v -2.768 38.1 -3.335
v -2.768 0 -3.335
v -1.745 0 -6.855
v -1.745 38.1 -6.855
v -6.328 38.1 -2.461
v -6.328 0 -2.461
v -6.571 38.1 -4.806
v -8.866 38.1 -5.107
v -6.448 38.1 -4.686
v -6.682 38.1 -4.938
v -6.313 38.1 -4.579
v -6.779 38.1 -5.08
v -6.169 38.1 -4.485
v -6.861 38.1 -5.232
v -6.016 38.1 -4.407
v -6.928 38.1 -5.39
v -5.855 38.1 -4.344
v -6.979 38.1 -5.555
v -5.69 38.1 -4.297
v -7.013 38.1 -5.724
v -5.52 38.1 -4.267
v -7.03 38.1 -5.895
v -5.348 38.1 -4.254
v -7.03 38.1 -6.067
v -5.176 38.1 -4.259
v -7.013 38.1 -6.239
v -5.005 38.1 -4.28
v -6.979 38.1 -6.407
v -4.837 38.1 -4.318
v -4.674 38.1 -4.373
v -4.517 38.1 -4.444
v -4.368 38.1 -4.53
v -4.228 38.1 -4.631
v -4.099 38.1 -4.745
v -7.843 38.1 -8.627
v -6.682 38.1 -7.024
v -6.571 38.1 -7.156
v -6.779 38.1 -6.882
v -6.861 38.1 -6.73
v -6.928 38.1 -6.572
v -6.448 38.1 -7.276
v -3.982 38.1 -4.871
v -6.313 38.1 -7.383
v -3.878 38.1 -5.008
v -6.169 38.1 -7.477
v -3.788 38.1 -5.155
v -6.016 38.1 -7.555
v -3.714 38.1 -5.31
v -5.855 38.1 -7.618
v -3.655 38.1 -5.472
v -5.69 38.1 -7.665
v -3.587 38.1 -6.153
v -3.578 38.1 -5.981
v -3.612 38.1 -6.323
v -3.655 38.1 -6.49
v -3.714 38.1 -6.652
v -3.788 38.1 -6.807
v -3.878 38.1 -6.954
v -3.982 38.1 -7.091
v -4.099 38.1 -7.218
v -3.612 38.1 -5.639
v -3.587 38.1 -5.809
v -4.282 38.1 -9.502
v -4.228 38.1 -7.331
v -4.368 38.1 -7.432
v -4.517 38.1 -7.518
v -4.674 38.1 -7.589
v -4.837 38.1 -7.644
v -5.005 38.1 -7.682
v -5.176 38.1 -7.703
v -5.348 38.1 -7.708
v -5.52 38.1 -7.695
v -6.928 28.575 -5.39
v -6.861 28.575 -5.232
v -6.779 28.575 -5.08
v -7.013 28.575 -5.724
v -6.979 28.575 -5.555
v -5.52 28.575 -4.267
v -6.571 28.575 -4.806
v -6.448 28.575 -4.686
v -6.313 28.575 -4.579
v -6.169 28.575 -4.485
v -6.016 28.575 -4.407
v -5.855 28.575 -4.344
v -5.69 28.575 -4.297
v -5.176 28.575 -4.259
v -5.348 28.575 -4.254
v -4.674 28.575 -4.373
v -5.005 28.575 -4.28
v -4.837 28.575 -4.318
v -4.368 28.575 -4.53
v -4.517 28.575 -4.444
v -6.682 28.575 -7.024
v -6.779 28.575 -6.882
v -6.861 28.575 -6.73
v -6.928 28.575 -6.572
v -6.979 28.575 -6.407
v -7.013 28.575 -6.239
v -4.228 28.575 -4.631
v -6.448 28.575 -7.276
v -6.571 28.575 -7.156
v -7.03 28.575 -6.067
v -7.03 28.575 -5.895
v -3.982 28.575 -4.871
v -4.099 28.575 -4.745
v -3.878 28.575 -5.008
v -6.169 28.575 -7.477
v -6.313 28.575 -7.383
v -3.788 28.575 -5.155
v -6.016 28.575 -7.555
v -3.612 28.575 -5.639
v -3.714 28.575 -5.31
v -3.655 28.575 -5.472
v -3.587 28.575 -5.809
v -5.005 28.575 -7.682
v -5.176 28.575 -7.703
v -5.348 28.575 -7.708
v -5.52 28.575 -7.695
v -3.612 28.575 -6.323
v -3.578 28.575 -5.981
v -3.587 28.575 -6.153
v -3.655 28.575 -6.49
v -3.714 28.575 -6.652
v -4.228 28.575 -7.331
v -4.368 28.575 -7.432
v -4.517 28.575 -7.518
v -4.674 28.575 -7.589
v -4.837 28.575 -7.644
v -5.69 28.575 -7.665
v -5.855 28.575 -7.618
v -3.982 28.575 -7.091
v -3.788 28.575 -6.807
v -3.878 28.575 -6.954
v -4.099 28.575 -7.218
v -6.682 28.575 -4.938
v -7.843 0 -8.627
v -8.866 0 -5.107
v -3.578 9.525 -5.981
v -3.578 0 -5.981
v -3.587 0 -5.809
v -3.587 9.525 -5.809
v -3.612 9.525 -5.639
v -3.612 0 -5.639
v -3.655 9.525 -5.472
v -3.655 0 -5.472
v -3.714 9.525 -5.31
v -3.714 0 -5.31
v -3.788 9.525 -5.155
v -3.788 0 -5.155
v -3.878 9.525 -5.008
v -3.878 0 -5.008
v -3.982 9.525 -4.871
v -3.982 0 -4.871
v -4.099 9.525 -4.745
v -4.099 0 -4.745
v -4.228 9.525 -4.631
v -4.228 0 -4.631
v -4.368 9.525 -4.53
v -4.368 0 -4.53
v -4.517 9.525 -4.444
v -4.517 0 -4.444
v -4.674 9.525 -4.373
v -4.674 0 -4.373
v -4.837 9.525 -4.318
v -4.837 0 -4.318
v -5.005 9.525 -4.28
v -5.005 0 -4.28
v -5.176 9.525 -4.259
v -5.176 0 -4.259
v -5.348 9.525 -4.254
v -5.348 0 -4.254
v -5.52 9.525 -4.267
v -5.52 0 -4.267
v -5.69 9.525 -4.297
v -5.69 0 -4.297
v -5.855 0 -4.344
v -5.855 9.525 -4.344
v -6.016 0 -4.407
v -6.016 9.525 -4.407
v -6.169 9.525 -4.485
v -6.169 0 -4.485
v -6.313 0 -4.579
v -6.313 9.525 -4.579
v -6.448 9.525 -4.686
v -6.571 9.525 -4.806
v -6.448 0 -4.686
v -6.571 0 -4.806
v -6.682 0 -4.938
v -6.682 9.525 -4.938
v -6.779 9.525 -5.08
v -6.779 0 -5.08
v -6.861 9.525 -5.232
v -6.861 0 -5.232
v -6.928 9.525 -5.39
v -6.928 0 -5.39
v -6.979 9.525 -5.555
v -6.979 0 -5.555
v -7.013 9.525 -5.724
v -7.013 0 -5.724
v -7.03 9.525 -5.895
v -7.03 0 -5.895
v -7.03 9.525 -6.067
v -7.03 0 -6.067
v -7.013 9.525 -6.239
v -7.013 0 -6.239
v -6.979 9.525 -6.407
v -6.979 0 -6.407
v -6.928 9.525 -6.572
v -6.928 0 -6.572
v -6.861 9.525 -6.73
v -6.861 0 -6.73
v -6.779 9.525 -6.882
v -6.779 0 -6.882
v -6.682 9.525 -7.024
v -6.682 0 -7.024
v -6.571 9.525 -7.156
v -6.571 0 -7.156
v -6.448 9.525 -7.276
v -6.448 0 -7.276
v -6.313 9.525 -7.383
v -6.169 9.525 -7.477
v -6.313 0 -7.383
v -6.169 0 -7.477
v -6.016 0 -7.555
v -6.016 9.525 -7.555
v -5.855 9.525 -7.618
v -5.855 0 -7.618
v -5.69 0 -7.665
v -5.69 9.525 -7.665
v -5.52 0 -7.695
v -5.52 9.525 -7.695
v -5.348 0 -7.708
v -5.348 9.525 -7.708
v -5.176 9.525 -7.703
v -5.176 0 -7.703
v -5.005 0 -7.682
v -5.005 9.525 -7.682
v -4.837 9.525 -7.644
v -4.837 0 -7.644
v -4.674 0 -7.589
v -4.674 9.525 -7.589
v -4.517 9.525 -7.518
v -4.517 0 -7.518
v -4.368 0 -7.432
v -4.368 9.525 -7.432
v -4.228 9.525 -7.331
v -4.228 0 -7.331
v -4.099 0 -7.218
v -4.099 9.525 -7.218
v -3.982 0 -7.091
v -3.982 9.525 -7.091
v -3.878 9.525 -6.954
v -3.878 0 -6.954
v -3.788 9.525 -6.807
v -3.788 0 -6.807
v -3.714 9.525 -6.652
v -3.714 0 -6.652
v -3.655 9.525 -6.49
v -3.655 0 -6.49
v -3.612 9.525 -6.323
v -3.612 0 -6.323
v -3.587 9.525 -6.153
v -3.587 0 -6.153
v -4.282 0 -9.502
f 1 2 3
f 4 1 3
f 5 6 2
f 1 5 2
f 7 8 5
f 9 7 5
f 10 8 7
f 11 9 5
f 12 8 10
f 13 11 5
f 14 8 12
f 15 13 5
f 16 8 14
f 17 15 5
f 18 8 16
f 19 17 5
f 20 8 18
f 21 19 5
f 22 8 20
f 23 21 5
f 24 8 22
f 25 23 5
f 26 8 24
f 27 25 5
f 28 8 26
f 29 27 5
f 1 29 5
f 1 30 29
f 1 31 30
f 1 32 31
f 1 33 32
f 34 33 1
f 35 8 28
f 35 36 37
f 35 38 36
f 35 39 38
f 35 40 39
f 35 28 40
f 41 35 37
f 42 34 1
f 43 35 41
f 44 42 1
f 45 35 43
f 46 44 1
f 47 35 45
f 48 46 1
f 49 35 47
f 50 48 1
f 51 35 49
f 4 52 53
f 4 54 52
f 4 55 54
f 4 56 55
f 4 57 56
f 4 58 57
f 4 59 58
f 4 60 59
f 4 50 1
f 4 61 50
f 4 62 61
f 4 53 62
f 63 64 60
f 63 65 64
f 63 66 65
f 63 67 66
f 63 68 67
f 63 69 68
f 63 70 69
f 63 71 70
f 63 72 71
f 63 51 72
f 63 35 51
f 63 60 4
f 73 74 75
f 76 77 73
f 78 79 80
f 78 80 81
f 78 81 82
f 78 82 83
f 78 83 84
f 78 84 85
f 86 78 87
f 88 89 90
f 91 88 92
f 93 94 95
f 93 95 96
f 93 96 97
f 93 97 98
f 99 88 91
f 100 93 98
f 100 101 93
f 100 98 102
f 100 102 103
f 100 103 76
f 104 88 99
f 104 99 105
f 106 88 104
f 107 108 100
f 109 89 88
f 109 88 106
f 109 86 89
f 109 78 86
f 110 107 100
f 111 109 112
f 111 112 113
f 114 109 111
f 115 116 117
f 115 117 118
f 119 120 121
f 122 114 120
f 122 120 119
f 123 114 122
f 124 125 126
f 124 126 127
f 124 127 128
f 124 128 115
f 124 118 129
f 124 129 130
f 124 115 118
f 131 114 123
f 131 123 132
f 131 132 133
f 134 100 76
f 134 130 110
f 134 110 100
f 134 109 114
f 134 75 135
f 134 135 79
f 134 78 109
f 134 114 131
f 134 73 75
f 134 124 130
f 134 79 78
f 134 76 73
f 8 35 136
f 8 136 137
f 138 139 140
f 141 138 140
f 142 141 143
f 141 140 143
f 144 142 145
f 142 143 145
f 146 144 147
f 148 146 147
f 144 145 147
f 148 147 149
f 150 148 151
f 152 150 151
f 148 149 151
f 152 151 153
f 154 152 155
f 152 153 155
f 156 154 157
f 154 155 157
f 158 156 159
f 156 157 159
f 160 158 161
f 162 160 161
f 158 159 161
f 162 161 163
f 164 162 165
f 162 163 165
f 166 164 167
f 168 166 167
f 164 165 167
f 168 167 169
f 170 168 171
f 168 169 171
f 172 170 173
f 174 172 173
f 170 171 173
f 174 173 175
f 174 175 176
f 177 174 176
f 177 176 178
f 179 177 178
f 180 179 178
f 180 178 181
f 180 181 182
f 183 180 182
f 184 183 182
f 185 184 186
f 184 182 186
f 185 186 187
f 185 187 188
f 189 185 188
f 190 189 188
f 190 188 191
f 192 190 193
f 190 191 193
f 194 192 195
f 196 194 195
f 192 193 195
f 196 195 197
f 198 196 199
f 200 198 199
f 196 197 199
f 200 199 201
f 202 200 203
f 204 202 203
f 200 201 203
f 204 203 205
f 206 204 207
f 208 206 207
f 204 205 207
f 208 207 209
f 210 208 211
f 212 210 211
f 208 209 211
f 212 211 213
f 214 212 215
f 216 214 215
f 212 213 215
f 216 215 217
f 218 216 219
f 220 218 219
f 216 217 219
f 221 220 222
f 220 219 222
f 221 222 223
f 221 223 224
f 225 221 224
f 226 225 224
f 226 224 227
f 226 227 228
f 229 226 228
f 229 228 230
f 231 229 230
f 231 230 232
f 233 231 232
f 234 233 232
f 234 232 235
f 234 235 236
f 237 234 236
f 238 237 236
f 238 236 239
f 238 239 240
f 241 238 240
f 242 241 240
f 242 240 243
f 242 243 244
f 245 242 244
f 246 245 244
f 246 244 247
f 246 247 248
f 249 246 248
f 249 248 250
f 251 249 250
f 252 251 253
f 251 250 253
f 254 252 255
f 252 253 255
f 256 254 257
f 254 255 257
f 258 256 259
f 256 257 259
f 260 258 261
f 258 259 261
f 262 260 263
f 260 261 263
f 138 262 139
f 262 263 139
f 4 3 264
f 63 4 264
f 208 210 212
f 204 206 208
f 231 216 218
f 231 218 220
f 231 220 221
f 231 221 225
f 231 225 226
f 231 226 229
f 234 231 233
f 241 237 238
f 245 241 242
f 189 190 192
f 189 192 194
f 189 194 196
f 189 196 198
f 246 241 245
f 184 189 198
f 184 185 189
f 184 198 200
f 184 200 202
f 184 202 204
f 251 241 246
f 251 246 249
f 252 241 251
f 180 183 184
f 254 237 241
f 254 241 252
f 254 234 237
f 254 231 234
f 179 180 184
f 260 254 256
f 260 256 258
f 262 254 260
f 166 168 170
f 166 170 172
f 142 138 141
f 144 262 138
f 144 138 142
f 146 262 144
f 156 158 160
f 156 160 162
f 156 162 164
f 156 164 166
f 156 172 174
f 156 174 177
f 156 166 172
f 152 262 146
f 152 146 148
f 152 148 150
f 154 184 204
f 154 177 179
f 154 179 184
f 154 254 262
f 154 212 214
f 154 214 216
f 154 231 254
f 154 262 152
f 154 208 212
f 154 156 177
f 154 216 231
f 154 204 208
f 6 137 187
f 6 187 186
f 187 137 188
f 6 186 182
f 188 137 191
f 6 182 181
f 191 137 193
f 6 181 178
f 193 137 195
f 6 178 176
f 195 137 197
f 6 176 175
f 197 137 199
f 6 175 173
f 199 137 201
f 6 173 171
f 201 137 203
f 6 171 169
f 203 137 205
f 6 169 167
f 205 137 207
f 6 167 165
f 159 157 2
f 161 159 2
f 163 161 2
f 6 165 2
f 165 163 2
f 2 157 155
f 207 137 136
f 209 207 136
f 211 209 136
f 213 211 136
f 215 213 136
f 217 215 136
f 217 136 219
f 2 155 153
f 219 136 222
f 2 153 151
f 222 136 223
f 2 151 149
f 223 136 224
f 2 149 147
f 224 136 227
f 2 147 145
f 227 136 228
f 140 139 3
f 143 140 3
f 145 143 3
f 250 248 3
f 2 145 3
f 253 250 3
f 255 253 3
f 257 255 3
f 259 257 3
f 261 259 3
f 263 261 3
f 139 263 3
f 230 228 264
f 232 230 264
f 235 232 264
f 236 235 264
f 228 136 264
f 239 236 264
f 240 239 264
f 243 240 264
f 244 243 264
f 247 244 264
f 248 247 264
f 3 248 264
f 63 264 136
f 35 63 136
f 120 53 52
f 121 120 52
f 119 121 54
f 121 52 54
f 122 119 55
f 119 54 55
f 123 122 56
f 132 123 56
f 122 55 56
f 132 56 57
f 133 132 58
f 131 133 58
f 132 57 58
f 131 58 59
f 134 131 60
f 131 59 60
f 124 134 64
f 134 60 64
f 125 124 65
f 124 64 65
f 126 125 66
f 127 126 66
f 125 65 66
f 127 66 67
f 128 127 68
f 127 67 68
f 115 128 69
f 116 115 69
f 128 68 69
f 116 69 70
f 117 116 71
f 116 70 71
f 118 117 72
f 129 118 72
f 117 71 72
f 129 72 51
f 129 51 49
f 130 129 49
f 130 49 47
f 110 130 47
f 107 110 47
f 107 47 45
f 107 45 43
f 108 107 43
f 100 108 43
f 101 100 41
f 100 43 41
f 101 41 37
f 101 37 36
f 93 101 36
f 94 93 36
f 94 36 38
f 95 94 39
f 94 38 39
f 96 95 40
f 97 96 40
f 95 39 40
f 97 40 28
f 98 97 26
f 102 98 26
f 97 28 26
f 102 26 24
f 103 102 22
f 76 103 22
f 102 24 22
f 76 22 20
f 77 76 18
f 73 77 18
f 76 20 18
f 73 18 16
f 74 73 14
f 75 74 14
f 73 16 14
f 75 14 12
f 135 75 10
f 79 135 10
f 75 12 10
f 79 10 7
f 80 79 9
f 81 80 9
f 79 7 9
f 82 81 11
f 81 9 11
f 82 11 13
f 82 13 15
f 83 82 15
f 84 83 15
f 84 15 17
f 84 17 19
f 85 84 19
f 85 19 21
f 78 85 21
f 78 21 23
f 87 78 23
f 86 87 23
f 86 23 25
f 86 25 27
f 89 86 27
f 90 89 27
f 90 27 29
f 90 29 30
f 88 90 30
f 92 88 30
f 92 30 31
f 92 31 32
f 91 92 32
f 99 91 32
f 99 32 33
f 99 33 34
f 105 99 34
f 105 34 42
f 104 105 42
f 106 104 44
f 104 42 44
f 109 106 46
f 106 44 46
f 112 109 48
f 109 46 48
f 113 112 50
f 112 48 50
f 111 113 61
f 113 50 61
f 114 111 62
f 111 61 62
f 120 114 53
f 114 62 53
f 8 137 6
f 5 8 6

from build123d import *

# Parameters (mm, degrees)
BOSS_EXTRUDE1_DEPTH = 38.1
SKETCH2_R           = 1.7272
CUT_EXTRUDE1_DEPTH  = 9.525
SKETCH3_R           = 1.7272
CUT_EXTRUDE2_DEPTH  = 9.525


with BuildPart() as part:
    # Sketch1 → Boss-Extrude1 (new body)
    with BuildSketch(Plane(origin=(0, 0, 0), x_dir=(1, 0, 0), z_dir=(0, 1, 0))):
        Polygon((-2.767735883, 3.334911674), (-1.744793251, 6.855482892), (-4.282226046, 9.501662807), (-7.842601473, 8.627271504), (-8.865544105, 5.106700285), (-6.32811131, 2.46052037), align=None)
    extrude(amount=BOSS_EXTRUDE1_DEPTH)

    # Sketch2 → Cut-Extrude1 (cut)
    with BuildSketch(Plane(origin=(0, 38.1, 0), x_dir=(1, 0, 0), z_dir=(0, 1, 0))):
        with Locations((-5.305168678, 5.981091589)):
            Circle(SKETCH2_R)
    extrude(amount=-CUT_EXTRUDE1_DEPTH, mode=Mode.SUBTRACT)

    # Sketch3 → Cut-Extrude2 (cut)
    with BuildSketch(Plane.XZ):
        with Locations((-5.305168678, -5.981091589)):
            Circle(SKETCH3_R)
    extrude(amount=-CUT_EXTRUDE2_DEPTH, mode=Mode.SUBTRACT)


solid = part.part
